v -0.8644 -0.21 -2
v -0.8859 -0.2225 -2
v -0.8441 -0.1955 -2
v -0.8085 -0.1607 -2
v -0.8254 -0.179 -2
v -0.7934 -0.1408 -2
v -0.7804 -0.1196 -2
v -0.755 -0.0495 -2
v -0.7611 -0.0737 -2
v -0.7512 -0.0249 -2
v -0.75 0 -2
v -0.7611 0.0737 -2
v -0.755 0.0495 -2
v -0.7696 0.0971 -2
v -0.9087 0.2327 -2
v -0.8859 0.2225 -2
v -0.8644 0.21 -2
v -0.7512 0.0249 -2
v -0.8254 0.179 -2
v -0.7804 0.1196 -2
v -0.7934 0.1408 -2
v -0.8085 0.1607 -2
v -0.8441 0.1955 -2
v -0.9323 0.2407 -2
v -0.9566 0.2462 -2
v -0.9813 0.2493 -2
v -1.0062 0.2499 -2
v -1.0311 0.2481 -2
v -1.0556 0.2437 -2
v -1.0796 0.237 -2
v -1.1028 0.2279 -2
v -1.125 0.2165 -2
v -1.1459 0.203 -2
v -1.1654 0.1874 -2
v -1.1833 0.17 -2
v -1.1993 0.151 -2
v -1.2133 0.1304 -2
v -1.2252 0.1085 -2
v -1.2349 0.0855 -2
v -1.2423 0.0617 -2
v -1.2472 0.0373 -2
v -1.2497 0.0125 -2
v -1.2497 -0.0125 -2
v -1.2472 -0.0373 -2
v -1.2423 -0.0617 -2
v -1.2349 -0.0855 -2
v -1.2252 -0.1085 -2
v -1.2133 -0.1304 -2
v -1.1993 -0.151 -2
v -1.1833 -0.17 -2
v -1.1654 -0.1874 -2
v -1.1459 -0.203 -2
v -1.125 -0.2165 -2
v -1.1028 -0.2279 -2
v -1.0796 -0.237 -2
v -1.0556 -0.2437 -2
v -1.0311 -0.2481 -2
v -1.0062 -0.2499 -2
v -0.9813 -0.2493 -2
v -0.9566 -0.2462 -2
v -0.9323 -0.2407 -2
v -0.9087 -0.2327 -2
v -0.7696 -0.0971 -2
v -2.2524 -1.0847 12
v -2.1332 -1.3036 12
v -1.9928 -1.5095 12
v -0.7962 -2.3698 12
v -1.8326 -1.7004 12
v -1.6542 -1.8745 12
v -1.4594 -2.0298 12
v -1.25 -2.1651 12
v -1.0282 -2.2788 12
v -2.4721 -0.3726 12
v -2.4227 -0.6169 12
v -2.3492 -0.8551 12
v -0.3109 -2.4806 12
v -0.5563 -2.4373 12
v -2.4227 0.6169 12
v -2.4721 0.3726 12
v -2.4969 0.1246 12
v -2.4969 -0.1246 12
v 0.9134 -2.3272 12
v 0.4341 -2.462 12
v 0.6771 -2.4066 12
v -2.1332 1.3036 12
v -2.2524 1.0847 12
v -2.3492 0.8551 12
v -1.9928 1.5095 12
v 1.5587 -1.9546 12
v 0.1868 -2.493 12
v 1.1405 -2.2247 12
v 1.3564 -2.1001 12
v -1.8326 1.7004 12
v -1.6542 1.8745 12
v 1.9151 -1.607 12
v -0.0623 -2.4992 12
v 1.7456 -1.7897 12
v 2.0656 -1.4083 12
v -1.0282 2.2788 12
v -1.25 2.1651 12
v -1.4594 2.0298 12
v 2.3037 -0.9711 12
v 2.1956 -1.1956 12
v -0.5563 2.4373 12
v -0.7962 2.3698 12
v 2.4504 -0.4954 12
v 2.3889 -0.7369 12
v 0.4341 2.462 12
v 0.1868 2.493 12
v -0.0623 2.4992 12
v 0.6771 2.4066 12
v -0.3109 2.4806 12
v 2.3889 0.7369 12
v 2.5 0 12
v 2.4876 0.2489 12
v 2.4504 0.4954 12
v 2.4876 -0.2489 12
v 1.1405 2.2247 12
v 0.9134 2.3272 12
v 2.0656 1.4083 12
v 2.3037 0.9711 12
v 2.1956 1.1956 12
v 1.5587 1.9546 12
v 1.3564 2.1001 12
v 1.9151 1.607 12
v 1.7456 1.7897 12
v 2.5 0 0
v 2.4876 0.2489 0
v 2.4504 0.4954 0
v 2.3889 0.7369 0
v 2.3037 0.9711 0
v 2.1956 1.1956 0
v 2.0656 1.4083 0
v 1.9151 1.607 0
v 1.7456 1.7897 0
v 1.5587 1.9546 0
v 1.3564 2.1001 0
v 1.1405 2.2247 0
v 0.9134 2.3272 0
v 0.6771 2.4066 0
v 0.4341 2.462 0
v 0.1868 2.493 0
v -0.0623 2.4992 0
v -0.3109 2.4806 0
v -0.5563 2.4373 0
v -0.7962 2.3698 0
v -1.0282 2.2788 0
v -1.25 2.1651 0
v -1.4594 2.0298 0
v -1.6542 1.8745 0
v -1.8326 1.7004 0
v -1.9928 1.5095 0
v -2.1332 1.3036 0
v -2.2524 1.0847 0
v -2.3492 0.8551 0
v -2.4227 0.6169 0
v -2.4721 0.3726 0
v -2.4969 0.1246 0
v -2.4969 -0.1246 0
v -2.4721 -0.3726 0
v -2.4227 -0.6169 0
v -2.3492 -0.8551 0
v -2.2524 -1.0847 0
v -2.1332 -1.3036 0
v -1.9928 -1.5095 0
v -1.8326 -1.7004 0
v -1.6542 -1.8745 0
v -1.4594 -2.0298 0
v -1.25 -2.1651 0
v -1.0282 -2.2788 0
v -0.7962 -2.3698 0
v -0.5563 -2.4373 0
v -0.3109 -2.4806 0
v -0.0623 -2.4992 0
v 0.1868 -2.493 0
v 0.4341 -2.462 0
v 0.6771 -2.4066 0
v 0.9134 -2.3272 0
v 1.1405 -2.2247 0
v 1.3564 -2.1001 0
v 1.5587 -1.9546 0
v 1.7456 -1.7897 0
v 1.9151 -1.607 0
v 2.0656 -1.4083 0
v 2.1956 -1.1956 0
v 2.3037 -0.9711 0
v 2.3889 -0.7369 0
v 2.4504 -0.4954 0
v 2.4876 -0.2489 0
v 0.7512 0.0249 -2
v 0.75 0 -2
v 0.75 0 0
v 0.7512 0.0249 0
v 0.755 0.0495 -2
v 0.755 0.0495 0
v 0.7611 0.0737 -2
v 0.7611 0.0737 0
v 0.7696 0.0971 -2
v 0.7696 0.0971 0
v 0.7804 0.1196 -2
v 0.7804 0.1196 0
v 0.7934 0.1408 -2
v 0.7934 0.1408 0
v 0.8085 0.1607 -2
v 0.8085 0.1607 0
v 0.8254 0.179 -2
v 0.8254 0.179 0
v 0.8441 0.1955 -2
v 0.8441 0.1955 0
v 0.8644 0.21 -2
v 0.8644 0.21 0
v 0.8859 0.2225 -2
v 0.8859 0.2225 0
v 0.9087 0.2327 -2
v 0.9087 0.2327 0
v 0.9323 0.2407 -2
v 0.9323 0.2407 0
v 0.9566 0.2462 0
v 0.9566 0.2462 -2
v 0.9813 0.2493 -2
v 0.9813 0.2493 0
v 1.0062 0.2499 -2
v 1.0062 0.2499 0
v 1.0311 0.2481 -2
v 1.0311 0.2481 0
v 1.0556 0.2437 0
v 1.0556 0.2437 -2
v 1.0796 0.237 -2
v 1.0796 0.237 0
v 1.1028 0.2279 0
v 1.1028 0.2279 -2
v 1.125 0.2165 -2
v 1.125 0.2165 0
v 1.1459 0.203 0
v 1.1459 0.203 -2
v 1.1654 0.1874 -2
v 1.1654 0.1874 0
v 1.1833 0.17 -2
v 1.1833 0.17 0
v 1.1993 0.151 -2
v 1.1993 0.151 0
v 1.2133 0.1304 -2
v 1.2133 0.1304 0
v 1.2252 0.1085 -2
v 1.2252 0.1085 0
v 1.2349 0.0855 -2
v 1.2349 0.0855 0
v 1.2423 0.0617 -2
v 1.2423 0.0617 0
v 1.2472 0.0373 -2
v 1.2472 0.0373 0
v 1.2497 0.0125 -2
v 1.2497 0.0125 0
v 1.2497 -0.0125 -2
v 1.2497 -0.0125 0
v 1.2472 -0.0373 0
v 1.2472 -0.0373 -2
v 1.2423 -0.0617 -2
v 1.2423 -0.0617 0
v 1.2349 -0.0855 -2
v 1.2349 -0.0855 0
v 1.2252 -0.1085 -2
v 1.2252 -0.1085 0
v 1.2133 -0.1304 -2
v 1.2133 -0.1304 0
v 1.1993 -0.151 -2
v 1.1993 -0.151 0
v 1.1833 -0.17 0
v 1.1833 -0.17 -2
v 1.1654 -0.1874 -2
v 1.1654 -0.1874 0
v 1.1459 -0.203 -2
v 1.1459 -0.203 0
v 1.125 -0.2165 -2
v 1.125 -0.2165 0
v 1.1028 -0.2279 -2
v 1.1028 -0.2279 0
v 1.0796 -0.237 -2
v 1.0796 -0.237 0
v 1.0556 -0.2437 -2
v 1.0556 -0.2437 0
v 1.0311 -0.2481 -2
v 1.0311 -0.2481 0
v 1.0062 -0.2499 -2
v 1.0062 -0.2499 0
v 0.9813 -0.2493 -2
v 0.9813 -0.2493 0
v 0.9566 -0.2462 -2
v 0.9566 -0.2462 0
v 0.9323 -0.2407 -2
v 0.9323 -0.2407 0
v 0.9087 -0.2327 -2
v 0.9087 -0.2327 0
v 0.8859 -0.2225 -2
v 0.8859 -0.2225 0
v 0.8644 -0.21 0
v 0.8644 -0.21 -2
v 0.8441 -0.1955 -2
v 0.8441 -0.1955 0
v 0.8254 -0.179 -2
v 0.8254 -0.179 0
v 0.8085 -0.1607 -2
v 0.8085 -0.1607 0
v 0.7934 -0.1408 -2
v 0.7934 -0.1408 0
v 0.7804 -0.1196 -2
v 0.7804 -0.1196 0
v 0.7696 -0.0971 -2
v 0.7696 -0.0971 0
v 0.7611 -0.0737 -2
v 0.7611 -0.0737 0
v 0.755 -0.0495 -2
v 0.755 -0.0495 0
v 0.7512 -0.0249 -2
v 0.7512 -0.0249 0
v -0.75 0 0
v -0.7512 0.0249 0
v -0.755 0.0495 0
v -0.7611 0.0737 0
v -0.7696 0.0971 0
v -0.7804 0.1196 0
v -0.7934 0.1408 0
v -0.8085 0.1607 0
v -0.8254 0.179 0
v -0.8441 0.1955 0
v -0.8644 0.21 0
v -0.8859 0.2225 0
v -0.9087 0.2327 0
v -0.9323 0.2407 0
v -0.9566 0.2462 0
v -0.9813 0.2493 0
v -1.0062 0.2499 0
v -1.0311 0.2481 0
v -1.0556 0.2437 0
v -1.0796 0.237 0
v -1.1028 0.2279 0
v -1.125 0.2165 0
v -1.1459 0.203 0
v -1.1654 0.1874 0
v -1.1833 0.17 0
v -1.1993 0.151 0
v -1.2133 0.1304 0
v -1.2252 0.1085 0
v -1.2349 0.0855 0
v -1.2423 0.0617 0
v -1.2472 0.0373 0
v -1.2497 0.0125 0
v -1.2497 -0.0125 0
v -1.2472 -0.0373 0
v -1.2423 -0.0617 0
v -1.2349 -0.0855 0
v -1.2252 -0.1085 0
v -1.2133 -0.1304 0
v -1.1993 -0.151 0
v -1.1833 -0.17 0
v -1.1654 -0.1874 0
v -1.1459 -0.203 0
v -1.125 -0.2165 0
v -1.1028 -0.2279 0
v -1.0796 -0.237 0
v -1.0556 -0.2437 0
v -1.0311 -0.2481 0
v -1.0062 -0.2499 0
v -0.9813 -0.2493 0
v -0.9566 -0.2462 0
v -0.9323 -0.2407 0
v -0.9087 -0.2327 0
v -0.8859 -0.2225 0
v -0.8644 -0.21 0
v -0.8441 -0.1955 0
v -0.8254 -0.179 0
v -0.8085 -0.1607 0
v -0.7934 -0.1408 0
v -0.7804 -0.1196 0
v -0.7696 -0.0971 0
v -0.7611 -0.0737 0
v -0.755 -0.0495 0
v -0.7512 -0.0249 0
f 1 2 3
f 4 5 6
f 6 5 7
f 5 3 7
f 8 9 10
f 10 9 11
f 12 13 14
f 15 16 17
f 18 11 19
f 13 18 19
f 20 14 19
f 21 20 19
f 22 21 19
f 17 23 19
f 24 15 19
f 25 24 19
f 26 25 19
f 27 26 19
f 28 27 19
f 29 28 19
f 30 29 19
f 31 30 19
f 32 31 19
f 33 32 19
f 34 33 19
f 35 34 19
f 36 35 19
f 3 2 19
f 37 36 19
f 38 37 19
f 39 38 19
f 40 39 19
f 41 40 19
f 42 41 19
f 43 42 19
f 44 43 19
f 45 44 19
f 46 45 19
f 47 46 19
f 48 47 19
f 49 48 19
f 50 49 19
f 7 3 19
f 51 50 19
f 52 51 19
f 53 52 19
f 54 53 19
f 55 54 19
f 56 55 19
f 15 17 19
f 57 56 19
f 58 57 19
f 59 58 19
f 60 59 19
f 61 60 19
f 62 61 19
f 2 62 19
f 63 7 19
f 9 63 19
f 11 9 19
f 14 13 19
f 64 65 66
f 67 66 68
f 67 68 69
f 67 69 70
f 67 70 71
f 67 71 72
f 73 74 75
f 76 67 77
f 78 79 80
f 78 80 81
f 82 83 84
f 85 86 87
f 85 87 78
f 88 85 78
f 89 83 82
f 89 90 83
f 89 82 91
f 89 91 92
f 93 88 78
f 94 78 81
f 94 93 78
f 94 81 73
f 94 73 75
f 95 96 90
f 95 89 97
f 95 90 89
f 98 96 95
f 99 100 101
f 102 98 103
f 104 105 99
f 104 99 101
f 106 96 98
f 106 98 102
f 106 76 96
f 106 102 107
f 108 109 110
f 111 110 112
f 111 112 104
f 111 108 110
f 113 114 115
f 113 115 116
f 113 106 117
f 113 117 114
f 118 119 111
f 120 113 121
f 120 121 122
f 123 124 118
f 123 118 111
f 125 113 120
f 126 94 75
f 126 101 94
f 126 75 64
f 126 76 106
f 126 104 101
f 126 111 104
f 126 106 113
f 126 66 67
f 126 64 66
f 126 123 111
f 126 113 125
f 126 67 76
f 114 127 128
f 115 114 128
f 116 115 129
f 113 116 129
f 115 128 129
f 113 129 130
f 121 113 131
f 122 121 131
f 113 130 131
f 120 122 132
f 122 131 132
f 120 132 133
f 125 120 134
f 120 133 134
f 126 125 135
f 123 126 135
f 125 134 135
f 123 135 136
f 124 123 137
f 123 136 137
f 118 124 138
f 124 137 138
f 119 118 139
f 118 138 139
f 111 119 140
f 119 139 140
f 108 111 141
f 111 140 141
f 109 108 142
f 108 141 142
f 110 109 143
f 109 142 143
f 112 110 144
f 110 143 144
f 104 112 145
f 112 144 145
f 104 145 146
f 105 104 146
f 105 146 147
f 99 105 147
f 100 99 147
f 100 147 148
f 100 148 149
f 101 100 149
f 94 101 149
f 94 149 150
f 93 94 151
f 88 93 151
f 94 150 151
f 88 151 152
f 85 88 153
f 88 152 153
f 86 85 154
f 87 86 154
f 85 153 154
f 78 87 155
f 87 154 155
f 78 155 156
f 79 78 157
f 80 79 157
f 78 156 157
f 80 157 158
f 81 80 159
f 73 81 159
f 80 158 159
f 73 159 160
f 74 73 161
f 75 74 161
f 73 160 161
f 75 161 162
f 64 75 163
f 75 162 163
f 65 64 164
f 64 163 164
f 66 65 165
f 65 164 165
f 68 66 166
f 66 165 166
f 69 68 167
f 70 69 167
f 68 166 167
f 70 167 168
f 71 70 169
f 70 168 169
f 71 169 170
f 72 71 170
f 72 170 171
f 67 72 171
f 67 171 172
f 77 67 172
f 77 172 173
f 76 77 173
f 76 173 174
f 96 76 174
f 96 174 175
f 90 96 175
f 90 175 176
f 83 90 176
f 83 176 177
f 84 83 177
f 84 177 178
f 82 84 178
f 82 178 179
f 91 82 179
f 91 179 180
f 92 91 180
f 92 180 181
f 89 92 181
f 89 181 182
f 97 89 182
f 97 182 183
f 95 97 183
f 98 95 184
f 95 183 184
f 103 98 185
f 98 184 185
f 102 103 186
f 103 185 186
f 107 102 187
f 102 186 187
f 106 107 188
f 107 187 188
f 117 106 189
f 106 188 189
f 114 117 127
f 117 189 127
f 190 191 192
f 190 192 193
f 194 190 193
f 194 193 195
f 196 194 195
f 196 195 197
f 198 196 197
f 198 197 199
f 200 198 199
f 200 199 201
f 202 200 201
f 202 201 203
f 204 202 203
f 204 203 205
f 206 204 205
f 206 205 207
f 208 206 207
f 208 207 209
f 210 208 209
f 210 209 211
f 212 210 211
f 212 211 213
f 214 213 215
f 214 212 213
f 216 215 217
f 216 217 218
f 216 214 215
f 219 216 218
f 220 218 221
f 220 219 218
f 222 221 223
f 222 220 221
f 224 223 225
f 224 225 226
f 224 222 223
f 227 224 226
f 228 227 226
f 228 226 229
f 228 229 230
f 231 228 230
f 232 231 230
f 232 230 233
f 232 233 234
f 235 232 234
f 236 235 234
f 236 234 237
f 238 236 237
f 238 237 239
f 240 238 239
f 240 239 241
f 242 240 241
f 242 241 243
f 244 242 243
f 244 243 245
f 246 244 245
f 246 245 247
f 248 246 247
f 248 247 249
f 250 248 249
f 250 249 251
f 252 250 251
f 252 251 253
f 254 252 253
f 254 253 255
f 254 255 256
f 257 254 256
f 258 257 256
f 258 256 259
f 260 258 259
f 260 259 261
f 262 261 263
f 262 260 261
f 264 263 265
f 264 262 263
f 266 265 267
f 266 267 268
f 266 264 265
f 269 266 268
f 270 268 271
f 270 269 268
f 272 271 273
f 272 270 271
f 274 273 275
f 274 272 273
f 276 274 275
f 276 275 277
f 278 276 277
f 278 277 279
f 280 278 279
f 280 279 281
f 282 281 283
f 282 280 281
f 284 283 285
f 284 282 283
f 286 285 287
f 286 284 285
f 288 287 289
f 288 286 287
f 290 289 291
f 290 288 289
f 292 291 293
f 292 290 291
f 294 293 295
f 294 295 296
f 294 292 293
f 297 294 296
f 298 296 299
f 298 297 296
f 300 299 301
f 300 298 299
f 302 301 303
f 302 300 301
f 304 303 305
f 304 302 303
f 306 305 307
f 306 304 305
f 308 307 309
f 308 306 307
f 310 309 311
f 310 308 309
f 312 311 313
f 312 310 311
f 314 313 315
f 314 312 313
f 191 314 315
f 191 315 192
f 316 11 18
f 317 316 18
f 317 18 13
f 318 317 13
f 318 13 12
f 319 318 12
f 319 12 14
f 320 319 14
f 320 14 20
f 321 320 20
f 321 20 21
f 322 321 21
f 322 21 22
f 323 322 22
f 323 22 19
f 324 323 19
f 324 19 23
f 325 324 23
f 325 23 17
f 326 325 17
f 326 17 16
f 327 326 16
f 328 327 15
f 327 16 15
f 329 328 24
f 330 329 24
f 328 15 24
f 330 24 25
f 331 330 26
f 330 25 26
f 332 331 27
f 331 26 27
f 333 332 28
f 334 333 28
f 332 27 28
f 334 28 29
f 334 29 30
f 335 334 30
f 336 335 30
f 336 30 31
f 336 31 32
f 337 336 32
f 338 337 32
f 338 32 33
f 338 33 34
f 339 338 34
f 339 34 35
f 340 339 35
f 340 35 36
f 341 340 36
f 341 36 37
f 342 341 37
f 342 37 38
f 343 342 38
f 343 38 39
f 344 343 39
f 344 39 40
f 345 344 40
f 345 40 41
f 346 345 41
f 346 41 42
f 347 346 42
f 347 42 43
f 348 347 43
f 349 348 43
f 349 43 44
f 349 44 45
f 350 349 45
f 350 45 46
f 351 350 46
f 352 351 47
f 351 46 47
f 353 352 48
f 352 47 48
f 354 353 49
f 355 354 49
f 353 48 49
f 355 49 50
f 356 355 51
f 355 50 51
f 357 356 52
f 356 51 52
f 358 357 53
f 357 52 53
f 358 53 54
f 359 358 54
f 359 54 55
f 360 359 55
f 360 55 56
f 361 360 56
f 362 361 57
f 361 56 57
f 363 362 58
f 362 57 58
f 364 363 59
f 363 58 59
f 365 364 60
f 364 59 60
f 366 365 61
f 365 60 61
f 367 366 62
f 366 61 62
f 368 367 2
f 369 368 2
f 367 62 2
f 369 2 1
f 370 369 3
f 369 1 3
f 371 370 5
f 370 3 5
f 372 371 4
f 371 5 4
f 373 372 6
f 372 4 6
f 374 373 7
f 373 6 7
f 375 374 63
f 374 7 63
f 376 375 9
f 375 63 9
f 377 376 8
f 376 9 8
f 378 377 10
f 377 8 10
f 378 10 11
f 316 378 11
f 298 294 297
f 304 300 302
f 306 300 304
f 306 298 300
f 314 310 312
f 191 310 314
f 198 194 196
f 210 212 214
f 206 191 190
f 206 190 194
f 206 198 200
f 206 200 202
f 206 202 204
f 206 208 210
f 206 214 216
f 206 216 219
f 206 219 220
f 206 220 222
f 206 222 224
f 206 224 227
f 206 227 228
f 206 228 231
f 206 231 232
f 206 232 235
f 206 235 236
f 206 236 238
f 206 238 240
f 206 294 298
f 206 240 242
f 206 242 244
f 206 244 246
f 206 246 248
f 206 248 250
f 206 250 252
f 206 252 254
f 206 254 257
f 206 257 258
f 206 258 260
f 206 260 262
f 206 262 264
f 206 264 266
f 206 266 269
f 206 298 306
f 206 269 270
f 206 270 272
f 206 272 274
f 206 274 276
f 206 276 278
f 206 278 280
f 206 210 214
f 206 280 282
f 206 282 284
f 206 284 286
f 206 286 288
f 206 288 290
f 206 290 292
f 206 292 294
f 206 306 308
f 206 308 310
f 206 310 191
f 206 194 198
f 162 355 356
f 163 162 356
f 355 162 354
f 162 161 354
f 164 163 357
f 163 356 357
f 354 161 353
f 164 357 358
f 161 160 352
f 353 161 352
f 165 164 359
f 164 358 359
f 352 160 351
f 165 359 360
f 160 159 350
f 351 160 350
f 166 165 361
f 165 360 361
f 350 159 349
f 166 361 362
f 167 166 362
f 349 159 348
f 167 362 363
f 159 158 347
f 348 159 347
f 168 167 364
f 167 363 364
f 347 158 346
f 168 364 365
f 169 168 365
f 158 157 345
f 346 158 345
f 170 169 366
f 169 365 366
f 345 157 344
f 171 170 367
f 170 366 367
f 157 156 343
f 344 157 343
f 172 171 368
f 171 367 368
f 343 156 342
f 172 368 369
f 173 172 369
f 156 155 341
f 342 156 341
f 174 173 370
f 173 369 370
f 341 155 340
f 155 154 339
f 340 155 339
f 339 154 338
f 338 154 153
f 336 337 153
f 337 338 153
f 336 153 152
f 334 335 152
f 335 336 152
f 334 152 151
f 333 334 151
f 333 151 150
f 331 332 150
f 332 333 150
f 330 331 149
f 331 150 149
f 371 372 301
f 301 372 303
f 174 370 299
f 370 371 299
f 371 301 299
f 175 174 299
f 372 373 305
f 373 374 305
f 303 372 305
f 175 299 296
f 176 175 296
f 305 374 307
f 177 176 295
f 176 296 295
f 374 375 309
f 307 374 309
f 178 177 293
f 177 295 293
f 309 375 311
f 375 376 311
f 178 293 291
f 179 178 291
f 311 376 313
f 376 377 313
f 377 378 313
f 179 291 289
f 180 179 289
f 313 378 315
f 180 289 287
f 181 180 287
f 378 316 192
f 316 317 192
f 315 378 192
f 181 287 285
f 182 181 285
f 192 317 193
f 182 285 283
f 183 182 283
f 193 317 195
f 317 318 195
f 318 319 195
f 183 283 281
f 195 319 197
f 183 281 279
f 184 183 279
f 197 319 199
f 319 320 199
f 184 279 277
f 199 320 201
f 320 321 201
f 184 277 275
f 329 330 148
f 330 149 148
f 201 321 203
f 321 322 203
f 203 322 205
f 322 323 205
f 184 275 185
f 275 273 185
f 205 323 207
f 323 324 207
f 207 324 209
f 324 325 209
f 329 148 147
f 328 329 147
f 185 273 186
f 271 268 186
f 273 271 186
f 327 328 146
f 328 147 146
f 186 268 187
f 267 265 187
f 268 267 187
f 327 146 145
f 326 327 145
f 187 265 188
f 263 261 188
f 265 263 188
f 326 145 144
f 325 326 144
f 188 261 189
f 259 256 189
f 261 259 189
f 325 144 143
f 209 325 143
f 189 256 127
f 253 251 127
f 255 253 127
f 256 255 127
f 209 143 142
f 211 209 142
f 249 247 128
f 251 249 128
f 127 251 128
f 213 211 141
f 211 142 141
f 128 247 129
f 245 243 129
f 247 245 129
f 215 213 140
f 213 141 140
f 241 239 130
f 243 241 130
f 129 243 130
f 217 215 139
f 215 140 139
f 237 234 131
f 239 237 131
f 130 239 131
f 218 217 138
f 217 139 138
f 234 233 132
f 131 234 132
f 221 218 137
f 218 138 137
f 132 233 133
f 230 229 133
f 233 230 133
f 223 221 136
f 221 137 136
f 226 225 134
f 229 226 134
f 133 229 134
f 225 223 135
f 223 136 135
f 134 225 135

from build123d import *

# Parameters (mm, degrees)
SKETCH1_R           = 2.5
BOSS_EXTRUDE1_DEPTH = 12
SKETCH3_R           = 0.25


with BuildPart() as part:
    # Sketch1 → Boss-Extrude1 (new body)
    with BuildSketch(Plane.XY):
        Circle(SKETCH1_R)
    extrude(amount=BOSS_EXTRUDE1_DEPTH)

    # Sweep1: sweep along a path in Sketch2
    with BuildLine(Plane(origin=(1, 0, 0), x_dir=(0, 0, -1), z_dir=(1, 0, 0))) as sweep1_path:
        Line((0, 0), (2, 0))
    # Sketch3 → Sweep1 (sweep)
    with BuildSketch(Plane(origin=(0, 0, 0), x_dir=(-1, 0, 0), z_dir=(0, 0, -1))):
        with Locations((-1, 0)):
            Circle(SKETCH3_R)
    sweep1 = sweep(path=sweep1_path.line)

    # Mirror1: Sweep1 across plane
    add(sweep1.mirror(Plane(origin=(0, 0, 0), x_dir=(0, 0, 1), z_dir=(1, 0, 0))))


solid = part.part
